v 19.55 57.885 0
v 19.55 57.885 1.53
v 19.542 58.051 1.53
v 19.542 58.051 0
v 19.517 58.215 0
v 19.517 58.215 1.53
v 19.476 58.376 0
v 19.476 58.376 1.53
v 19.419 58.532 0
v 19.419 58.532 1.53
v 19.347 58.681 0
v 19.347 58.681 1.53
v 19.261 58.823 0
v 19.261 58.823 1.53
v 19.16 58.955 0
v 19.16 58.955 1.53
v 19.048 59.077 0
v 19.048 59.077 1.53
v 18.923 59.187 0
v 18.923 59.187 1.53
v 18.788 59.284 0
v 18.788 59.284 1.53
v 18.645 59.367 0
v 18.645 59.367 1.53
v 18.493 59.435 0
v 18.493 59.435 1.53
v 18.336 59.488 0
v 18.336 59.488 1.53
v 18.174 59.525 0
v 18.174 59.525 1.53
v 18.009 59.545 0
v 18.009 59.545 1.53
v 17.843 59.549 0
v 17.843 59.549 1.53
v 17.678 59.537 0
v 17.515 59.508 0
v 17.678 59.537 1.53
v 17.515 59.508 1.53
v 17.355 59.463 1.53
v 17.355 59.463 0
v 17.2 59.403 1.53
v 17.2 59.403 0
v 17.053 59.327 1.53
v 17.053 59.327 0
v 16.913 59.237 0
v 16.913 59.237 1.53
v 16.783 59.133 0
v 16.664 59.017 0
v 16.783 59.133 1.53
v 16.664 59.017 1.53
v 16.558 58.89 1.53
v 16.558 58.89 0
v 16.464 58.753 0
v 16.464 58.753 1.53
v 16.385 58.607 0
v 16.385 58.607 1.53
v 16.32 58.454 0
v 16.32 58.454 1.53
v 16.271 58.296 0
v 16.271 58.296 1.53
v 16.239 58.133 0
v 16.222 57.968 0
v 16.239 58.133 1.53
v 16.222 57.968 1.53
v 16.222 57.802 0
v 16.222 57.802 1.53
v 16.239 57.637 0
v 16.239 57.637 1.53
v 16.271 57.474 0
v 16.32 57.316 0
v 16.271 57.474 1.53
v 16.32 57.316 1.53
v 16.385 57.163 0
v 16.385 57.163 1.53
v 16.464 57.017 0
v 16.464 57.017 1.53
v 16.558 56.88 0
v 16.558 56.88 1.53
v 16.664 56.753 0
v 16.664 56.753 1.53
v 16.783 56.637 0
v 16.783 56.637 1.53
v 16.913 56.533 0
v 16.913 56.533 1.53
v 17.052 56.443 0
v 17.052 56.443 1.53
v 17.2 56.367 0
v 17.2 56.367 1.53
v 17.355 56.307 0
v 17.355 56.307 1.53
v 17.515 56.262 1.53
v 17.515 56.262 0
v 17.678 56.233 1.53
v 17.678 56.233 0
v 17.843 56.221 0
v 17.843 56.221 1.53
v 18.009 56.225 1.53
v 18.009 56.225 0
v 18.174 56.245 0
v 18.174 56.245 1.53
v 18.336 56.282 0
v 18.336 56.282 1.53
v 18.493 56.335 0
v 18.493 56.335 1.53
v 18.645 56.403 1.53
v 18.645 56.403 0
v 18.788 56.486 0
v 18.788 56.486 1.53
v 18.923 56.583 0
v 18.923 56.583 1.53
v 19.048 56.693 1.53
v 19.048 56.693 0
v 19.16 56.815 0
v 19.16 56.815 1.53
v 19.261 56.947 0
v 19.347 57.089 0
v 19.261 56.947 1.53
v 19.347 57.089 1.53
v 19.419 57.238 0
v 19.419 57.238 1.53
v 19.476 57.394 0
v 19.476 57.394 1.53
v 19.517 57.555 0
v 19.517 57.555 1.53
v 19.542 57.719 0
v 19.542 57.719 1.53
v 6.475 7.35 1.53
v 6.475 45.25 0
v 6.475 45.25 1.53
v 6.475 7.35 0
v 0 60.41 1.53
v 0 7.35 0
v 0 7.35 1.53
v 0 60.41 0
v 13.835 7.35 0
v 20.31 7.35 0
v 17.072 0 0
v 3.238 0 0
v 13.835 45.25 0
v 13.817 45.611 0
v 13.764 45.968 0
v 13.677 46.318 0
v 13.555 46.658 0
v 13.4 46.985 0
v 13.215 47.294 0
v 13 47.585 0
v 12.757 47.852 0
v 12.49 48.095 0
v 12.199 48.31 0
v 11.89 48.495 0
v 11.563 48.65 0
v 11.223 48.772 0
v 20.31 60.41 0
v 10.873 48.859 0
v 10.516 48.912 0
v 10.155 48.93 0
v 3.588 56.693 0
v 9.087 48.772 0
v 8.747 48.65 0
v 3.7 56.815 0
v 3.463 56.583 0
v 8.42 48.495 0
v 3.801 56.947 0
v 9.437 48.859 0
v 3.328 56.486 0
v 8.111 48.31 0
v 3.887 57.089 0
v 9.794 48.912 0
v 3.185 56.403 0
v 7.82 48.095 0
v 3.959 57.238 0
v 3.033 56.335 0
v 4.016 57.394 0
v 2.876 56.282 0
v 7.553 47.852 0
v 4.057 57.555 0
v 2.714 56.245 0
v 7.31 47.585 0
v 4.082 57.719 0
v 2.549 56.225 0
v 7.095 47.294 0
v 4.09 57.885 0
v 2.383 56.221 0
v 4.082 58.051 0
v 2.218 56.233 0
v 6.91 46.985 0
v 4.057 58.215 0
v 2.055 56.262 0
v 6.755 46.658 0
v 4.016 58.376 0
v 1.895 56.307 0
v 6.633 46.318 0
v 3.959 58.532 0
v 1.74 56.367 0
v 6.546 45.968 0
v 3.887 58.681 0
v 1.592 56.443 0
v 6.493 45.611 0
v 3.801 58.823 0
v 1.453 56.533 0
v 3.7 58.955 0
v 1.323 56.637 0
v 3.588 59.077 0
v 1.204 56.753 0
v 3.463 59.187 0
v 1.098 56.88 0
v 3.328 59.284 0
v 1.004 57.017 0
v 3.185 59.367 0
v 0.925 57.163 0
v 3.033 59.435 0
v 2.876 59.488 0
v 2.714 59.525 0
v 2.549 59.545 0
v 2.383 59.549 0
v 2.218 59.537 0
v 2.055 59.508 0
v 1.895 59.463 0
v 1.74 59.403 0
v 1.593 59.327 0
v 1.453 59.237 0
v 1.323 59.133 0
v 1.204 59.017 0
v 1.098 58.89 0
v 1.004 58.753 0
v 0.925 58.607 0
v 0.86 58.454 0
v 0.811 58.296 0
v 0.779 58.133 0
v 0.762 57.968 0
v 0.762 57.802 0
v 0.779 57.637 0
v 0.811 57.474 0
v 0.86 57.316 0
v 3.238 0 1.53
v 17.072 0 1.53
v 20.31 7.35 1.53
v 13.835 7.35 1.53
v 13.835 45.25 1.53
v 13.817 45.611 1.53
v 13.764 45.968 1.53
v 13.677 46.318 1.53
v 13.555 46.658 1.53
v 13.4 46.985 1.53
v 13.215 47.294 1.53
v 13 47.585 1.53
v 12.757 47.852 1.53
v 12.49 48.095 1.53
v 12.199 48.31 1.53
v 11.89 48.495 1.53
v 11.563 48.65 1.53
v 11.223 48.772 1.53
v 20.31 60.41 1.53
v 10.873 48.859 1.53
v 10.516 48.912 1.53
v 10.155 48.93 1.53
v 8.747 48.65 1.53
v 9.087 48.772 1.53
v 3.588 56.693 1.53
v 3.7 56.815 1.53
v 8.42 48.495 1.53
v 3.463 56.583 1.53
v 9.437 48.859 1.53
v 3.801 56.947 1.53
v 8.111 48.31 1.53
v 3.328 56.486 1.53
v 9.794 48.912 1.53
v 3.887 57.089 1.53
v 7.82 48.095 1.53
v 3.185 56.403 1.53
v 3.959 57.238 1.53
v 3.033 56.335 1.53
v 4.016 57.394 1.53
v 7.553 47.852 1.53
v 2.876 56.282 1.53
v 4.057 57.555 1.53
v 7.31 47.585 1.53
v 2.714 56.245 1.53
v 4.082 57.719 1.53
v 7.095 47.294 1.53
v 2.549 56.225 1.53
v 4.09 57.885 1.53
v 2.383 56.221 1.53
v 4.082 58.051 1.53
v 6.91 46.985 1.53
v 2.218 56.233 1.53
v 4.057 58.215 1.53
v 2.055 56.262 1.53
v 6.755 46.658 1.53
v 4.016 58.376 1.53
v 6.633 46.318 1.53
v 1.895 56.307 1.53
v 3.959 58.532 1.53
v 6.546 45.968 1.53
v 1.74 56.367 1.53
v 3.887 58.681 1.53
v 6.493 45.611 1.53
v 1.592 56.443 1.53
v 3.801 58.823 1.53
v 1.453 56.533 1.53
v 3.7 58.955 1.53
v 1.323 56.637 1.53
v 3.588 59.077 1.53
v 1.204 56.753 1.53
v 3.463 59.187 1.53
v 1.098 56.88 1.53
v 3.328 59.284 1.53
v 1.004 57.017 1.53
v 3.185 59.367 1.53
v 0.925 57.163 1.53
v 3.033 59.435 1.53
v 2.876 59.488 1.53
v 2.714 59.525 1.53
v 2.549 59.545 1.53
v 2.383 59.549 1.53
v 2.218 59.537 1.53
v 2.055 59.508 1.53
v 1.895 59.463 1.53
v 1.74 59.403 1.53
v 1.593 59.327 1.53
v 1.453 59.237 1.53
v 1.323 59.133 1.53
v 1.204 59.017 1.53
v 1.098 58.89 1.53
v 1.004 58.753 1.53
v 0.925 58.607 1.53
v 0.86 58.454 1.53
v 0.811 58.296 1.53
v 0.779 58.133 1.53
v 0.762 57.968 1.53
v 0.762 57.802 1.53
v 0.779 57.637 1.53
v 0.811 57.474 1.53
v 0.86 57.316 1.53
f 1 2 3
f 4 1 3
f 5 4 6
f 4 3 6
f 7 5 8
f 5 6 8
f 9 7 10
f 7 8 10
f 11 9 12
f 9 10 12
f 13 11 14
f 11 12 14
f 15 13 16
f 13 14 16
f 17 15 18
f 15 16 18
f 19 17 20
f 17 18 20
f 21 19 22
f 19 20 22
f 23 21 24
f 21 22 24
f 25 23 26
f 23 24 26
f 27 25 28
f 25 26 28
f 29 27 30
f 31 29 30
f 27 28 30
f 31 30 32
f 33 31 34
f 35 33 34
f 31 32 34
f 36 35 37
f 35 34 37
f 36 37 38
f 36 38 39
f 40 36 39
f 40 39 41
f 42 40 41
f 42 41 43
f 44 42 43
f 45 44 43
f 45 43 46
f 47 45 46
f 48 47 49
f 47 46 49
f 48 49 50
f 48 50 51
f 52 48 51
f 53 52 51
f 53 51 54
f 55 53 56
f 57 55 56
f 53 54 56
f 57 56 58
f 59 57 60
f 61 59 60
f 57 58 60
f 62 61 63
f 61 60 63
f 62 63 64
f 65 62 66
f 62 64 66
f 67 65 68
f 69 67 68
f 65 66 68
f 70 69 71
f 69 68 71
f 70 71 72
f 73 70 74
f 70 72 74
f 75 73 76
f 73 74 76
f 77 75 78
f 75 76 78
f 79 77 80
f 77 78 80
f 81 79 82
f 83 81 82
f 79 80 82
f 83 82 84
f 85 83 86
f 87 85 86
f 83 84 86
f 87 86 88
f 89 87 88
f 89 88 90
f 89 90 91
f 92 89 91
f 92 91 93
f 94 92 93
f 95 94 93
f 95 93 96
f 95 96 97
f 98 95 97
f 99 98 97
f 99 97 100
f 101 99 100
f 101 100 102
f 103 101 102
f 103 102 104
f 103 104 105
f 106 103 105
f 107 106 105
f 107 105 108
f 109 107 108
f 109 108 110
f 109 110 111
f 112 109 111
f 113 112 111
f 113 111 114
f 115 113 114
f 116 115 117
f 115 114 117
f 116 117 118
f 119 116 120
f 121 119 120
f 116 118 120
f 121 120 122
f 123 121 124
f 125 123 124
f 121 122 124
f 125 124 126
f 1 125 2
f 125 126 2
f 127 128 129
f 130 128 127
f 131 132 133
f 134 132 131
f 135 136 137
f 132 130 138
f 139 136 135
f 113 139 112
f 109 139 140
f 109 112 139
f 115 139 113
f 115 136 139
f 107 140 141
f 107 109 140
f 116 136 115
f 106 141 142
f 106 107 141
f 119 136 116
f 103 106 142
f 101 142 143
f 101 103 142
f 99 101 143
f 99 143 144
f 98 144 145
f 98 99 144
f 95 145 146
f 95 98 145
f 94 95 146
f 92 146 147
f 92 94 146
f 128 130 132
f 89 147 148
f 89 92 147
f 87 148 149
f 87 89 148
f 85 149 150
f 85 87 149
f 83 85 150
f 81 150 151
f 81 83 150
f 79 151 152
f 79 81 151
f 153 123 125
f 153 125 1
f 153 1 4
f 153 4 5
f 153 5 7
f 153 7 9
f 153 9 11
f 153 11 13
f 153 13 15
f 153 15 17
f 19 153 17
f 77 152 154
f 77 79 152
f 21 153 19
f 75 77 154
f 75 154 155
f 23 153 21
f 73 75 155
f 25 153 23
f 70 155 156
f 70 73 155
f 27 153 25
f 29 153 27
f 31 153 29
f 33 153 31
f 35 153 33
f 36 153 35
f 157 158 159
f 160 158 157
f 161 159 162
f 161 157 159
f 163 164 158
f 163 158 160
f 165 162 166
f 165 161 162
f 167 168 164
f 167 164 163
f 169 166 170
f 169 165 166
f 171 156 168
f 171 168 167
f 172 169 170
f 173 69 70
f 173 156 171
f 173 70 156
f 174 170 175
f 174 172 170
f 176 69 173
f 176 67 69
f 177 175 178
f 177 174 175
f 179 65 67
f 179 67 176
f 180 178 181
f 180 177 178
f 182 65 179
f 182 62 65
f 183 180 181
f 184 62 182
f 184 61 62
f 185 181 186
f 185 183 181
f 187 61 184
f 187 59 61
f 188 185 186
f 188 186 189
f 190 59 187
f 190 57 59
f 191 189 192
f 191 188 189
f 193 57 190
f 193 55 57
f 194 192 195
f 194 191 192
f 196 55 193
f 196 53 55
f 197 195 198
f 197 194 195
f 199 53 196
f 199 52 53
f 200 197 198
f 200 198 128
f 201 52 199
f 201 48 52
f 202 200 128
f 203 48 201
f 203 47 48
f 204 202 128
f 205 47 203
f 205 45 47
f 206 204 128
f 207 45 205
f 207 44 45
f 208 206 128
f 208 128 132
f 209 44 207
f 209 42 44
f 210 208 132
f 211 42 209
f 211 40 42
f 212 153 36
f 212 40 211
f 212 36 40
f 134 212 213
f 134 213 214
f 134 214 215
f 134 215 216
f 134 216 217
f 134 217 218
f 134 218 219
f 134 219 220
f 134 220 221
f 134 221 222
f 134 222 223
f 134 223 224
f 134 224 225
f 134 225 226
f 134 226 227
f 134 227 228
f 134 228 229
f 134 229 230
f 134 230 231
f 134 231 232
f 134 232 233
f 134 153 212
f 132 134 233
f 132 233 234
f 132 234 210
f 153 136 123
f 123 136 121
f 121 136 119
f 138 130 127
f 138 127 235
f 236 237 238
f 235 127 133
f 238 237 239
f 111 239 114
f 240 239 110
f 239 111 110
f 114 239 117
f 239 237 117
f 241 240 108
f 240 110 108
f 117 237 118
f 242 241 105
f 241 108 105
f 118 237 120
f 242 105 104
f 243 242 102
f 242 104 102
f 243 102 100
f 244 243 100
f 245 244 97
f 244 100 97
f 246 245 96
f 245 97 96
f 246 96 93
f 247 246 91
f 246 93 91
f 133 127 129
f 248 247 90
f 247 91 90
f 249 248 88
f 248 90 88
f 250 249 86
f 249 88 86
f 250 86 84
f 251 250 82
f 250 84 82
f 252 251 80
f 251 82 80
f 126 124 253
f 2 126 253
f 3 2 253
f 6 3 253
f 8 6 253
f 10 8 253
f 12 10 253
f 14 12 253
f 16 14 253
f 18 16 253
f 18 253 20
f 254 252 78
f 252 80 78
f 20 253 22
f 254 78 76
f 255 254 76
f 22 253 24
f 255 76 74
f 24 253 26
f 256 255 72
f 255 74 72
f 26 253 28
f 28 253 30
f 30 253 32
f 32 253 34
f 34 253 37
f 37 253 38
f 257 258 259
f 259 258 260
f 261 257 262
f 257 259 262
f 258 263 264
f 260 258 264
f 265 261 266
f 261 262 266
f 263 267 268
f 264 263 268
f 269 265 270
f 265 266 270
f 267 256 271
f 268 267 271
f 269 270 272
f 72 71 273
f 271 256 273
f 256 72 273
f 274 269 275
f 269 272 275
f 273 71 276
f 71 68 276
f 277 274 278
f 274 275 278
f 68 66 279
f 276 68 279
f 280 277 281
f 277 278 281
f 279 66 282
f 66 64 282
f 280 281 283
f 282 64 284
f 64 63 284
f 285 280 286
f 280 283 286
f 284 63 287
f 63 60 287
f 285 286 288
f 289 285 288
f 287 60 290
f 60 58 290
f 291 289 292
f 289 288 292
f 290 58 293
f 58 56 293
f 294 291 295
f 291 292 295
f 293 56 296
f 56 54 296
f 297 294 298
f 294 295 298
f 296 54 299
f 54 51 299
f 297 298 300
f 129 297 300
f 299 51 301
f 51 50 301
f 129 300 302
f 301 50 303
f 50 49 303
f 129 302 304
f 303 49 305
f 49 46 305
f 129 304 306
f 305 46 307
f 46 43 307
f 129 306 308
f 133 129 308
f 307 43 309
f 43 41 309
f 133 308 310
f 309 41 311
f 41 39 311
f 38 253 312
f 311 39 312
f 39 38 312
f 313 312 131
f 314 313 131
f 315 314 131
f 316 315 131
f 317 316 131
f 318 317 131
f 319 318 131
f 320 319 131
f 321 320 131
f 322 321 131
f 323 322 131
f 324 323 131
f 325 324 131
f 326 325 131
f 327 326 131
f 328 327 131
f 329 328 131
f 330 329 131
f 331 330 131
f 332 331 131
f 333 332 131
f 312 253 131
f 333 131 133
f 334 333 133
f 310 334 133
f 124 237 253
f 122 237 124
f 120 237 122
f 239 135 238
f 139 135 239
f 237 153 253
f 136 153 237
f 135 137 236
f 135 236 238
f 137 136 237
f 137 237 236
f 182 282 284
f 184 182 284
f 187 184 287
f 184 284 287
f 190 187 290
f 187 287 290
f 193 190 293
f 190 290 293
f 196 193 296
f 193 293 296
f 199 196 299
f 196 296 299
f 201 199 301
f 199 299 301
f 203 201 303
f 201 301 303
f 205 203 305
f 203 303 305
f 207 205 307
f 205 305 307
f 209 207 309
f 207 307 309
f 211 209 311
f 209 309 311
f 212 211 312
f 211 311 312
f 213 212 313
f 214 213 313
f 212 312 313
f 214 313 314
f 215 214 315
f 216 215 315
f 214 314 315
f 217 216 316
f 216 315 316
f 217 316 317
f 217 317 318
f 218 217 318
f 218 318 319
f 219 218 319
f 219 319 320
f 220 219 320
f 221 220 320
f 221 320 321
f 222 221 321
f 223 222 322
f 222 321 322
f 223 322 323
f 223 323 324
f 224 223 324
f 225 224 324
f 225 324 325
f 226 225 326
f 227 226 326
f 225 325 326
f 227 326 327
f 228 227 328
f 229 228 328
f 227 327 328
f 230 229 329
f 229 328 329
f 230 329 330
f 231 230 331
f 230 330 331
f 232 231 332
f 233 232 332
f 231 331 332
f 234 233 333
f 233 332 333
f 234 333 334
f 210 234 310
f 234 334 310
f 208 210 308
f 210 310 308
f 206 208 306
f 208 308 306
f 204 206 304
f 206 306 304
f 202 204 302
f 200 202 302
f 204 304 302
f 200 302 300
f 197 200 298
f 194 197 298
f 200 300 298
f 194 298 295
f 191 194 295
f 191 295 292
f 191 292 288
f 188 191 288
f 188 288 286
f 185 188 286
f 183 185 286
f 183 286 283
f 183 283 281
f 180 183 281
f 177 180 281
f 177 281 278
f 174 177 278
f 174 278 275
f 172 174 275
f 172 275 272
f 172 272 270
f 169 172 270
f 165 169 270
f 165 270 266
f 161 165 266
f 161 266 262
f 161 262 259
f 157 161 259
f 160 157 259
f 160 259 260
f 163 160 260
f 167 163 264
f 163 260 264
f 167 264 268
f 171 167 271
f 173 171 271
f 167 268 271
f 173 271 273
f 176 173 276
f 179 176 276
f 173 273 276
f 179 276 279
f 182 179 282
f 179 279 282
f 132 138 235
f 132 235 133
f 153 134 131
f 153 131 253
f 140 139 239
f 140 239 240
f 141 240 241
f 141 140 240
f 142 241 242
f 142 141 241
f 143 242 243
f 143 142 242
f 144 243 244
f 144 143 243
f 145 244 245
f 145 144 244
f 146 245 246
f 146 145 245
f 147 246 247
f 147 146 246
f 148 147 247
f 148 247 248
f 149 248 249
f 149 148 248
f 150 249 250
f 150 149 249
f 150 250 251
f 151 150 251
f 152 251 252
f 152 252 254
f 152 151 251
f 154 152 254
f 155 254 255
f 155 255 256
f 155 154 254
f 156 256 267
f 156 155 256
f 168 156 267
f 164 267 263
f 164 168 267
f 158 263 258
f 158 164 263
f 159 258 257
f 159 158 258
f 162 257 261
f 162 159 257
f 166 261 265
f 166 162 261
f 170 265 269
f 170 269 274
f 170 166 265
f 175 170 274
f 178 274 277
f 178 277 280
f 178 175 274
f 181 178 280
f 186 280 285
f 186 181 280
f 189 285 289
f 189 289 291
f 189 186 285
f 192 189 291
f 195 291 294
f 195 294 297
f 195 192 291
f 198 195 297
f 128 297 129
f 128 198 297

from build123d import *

# Parameters (mm, degrees)
BOSS_EXTRU_1_DEPTH      = 1.53
ESQUISSE2_R             = 1.665
ENL_V_MAT_EXTRU_1_DEPTH = 1.53


with BuildPart() as part:
    # Esquisse1 → Boss.-Extru.1 (new body)
    with BuildSketch(Plane.XY):
        with BuildLine():
            Line((0, 7.35), (0, 60.41))
            Line((0, 60.41), (20.31, 60.41))
            Line((20.31, 60.41), (20.31, 7.35))
            Line((20.31, 7.35), (17.0725, 0))
            Line((17.0725, 0), (13.835, 7.35))
            Line((13.835, 7.35), (13.835, 45.25))
            ThreePointArc((13.835, 45.25), (10.155, 48.93), (6.475, 45.25))
            Line((6.475, 45.25), (6.475, 7.35))
            Line((6.475, 7.35), (3.2375, 0))
            Line((3.2375, 0), (0, 7.35))
        make_face()
    extrude(amount=BOSS_EXTRU_1_DEPTH)

    # Esquisse2 → Enlèv. mat.-Extru.1 (cut)
    with BuildSketch(Plane.XY.offset(1.53)):
        with Locations((2.425, 57.885)):
            Circle(ESQUISSE2_R)
        with Locations((17.885, 57.885)):
            Circle(ESQUISSE2_R)
    extrude(amount=-ENL_V_MAT_EXTRU_1_DEPTH, mode=Mode.SUBTRACT)


solid = part.part
